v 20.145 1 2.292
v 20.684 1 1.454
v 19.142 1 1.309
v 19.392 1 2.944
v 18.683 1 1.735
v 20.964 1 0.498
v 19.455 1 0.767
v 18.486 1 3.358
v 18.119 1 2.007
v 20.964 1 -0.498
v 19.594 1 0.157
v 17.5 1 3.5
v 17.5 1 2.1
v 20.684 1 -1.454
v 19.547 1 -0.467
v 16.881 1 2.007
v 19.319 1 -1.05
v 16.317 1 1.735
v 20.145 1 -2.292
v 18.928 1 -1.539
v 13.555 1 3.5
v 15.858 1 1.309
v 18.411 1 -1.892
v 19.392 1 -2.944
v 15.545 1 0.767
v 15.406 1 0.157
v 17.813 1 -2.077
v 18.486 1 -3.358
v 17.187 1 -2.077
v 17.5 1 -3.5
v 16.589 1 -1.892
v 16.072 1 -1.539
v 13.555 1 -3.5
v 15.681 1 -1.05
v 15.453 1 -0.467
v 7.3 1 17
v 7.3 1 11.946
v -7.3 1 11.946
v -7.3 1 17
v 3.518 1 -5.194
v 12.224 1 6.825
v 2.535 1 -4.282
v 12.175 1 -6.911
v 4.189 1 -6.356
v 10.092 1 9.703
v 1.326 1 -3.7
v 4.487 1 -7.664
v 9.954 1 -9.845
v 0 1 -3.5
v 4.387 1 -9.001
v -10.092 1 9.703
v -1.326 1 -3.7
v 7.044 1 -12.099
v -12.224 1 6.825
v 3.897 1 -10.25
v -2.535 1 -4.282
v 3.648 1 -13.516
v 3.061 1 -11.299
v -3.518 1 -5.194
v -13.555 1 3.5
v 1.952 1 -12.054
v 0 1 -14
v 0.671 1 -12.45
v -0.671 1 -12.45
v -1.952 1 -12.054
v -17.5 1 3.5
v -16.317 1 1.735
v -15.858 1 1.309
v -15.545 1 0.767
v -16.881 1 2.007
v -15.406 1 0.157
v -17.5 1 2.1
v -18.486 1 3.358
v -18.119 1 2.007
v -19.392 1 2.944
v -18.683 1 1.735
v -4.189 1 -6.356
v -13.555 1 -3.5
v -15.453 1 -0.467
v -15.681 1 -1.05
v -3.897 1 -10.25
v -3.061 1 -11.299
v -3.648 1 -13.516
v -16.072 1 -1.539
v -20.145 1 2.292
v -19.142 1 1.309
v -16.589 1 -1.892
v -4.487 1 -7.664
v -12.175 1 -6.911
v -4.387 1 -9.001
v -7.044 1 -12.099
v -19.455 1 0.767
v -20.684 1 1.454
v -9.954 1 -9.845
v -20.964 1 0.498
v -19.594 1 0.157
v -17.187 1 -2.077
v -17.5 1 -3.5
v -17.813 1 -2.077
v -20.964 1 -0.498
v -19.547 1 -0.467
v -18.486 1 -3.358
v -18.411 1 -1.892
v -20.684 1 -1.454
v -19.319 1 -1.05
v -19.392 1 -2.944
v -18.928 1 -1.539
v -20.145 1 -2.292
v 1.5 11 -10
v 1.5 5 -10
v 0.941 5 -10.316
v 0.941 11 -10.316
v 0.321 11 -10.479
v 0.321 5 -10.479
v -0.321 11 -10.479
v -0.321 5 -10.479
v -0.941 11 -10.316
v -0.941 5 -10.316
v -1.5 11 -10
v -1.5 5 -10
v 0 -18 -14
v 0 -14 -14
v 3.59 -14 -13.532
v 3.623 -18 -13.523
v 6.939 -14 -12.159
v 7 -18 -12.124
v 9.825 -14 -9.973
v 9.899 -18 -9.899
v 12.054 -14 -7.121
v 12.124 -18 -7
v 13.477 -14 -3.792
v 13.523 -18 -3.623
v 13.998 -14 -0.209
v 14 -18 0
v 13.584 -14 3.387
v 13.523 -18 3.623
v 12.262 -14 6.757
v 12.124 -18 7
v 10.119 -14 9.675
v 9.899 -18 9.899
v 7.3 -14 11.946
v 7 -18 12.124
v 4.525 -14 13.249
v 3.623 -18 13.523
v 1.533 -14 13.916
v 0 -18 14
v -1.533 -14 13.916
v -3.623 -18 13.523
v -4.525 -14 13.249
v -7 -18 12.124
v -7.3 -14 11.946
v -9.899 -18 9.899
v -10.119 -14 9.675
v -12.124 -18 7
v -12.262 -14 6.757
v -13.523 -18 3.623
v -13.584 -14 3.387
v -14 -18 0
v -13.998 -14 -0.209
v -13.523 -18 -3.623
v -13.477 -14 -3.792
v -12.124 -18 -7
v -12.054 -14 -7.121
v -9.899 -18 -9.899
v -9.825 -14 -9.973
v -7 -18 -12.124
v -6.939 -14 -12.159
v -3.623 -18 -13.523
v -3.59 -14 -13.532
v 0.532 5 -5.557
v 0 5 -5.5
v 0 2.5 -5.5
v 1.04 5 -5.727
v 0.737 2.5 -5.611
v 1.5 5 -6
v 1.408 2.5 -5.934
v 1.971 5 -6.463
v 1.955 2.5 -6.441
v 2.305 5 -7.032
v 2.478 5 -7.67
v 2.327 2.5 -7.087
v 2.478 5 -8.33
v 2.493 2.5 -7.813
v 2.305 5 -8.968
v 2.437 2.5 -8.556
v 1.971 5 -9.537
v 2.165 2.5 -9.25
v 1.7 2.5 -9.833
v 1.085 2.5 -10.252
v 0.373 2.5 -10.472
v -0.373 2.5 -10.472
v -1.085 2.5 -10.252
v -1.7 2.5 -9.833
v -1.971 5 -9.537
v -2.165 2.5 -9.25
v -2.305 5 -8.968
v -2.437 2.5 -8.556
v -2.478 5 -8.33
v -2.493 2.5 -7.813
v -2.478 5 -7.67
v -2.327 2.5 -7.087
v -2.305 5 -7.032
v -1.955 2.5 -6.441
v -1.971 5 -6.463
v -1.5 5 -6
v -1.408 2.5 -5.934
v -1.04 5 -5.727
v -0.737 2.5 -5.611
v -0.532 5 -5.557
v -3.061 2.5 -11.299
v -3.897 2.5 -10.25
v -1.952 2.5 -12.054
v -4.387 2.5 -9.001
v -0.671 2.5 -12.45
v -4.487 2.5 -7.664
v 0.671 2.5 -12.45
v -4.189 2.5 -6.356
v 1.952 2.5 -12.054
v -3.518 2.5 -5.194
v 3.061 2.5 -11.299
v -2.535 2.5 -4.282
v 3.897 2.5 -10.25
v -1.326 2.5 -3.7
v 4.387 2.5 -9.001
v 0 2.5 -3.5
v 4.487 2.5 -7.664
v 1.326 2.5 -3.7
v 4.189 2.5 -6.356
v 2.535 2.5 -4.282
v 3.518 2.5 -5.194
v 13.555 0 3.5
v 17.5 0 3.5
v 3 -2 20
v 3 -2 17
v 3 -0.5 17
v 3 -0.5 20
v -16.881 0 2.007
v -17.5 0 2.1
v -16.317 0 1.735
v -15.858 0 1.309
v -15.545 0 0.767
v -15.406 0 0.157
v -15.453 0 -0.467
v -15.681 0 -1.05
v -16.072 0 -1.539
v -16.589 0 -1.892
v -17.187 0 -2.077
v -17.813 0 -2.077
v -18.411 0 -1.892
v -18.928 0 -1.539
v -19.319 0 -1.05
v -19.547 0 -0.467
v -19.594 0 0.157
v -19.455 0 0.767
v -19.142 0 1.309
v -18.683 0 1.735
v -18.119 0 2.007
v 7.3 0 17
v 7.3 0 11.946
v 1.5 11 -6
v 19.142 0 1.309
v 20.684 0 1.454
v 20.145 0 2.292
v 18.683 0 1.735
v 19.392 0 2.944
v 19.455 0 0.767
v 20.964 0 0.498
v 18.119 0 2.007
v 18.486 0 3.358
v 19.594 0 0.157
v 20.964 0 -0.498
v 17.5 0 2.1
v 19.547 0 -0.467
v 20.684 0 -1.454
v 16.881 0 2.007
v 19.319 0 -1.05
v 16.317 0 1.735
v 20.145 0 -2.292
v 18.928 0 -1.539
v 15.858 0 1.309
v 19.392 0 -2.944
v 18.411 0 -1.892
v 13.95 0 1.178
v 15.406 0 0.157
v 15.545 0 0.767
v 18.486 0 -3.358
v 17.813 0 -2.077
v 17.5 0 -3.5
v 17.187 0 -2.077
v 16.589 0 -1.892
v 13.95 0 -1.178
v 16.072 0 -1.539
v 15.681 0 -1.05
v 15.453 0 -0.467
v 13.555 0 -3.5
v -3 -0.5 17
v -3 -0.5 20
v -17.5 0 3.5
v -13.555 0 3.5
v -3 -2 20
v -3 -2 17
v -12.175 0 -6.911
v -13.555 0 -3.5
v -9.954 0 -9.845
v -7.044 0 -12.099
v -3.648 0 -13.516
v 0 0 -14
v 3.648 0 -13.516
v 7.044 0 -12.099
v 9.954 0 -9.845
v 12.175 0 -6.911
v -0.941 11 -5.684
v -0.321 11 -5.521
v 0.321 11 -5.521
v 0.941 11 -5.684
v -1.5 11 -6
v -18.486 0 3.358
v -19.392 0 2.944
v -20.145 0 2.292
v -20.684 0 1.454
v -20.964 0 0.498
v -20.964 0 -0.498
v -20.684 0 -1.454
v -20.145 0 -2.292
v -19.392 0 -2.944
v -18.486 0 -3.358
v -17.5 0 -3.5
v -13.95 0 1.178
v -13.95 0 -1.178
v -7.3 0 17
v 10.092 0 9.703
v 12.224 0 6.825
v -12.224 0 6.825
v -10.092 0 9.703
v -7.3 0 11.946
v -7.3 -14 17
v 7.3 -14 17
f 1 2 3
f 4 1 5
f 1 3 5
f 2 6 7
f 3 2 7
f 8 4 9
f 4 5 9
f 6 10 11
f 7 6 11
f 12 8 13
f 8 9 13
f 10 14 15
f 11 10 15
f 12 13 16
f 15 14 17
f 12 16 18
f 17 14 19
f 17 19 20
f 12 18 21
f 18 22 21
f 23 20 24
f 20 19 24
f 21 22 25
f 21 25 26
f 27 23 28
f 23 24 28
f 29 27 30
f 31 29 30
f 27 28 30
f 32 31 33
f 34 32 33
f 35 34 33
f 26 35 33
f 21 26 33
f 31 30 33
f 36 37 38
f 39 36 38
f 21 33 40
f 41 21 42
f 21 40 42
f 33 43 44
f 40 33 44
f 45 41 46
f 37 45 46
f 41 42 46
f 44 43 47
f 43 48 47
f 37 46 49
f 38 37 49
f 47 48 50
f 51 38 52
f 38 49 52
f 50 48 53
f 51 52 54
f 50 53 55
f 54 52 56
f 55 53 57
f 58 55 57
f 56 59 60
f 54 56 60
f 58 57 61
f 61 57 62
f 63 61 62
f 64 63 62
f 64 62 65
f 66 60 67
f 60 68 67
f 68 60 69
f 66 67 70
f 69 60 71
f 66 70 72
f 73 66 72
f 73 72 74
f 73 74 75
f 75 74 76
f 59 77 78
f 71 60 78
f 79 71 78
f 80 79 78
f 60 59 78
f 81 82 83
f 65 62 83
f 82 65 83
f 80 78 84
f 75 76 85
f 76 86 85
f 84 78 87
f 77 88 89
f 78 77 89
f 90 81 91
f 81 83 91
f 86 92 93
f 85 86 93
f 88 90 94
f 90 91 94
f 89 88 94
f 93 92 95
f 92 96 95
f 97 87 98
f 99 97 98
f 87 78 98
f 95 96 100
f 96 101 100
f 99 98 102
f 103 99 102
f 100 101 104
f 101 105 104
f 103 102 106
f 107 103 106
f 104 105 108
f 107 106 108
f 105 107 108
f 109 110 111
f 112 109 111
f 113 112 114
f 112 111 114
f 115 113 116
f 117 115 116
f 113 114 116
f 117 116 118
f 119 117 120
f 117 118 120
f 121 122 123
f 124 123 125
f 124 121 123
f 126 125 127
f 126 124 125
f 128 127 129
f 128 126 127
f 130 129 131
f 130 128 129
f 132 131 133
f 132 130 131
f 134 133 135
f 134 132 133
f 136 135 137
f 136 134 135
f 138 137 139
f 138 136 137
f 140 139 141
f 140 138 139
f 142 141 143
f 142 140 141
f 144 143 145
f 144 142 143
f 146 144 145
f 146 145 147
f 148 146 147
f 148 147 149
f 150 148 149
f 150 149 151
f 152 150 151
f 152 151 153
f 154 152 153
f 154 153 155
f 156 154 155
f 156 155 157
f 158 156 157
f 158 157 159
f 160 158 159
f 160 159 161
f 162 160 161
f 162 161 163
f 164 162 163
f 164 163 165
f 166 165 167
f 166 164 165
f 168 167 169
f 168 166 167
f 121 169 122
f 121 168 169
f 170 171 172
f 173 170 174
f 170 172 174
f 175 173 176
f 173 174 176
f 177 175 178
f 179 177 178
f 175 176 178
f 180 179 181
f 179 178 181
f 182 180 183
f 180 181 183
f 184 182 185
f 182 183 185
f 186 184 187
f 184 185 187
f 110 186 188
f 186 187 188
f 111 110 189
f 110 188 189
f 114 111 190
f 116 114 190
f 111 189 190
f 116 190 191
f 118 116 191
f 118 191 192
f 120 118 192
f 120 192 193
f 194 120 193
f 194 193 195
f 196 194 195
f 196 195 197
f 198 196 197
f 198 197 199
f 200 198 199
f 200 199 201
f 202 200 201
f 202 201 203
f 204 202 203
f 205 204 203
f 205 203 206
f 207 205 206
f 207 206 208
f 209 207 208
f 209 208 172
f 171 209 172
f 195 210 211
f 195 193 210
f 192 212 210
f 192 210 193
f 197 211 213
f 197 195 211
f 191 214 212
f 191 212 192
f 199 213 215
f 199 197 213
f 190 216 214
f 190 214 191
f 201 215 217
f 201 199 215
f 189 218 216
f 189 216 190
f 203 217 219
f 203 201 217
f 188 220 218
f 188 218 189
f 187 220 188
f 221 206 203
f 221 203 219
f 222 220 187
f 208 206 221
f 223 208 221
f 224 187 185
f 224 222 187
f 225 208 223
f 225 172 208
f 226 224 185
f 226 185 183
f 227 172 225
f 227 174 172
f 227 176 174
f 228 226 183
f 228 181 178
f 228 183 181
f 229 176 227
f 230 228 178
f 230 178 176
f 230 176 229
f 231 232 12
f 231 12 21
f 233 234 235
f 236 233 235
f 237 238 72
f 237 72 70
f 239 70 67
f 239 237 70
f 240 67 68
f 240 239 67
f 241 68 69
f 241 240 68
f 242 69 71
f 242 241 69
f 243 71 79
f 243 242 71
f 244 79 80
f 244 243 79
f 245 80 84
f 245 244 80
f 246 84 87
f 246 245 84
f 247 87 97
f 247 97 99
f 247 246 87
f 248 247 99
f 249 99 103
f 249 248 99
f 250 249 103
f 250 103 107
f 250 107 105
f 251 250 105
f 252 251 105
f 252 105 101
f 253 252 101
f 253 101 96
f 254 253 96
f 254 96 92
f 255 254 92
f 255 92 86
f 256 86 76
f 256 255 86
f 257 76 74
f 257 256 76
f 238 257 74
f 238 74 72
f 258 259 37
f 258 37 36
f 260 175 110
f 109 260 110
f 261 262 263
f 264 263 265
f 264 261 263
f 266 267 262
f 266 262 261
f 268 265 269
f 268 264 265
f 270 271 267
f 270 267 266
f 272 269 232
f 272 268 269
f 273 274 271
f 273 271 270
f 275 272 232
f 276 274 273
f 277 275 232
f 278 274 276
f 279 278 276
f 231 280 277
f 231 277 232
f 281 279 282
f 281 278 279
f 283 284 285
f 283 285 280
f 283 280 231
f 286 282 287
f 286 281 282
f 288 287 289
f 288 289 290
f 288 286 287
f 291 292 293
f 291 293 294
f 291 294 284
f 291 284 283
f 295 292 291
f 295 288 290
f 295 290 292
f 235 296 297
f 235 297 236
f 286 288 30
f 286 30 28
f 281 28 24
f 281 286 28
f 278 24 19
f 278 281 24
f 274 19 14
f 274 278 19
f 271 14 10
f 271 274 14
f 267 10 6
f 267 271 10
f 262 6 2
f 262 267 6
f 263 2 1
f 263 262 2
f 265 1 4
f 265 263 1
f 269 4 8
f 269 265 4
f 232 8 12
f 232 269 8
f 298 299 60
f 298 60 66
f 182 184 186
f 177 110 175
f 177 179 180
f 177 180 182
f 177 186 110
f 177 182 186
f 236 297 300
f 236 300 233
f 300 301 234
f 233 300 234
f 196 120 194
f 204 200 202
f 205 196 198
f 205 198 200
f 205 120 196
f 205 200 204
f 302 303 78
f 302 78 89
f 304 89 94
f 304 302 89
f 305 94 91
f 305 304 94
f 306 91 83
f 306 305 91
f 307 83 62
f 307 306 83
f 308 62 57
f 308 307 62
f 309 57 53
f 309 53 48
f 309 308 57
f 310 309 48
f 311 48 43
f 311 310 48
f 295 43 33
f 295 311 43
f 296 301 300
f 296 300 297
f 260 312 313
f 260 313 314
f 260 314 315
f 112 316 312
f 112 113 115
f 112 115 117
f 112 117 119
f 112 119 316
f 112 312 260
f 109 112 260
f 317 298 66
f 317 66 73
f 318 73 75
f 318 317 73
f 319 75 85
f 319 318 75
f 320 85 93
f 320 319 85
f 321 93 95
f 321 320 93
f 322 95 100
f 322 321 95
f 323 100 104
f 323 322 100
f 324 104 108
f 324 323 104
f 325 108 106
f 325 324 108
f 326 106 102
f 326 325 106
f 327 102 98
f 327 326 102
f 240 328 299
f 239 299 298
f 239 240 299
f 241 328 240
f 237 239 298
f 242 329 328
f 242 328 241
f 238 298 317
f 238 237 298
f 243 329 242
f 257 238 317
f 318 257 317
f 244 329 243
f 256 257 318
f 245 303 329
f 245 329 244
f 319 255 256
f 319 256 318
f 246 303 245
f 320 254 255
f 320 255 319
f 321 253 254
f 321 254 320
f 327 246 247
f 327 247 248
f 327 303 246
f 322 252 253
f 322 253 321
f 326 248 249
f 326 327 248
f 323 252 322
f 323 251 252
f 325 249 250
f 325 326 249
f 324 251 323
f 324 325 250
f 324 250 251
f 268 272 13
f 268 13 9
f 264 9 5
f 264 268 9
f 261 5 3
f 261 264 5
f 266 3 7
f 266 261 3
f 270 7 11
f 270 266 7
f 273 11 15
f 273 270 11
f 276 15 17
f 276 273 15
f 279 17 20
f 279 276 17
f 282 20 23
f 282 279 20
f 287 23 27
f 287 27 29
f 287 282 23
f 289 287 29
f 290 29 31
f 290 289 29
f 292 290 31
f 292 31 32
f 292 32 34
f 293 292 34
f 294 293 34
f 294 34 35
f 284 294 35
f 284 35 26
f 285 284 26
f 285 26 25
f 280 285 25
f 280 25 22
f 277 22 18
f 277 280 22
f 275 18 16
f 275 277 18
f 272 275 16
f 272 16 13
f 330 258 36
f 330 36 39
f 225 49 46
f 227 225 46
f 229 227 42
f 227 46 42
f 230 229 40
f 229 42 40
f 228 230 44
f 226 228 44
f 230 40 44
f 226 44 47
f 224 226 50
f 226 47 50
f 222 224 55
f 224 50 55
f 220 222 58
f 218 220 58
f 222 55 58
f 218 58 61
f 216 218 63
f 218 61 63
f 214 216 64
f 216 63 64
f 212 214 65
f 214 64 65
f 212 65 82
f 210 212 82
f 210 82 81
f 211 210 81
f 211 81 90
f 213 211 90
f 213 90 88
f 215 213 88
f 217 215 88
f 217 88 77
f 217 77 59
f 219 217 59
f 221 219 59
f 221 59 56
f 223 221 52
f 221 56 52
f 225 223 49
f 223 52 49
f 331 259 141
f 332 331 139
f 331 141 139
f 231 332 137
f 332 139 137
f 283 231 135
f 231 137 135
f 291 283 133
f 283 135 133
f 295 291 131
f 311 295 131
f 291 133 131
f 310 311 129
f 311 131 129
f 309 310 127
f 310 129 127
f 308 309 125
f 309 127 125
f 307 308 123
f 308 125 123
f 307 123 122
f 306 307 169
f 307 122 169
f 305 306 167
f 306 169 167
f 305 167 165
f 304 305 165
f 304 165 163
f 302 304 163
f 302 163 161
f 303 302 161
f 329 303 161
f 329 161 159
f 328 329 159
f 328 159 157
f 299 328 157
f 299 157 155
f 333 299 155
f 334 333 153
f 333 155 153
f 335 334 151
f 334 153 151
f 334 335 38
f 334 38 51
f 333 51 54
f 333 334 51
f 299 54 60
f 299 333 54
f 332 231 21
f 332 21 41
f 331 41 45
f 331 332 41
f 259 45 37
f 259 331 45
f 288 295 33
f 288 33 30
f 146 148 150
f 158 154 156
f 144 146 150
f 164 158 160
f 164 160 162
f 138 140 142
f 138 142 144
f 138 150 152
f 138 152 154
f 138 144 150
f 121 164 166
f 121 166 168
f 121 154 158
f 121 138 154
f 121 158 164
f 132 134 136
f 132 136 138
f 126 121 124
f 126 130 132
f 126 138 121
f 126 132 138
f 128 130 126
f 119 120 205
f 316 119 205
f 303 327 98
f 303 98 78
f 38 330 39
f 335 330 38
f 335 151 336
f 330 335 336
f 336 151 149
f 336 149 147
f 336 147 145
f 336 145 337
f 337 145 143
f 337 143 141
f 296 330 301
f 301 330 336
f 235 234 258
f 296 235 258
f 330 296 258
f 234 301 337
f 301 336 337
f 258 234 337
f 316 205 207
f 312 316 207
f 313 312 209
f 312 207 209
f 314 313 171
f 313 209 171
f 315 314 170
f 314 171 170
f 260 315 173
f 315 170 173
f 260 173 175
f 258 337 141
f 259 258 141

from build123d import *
from build123d.topology import SkipClean

# Parameters (mm, degrees)
SKETCH1_R           = 2.1
BOSS_EXTRUDE1_DEPTH = 1
BOSS_EXTRUDE2_START = -14
BOSS_EXTRUDE2_DEPTH = 14
BOSS_EXTRUDE3_START = 4
SKETCH3_R           = 14
BOSS_EXTRUDE3_DEPTH = 4
SKETCH4_R           = 4.5
BOSS_EXTRUDE4_DEPTH = 1.5
SKETCH5_R           = 2.5
BOSS_EXTRUDE5_DEPTH = 2.5
BOSS_EXTRUDE6_DEPTH = 6
SKETCH7_W           = 6
SKETCH7_H           = 1.5
BOSS_EXTRUDE7_DEPTH = 3


with BuildPart() as part:
    # Sketch1 → Boss-Extrude1 (new body)
    with BuildSketch(Plane(origin=(0, 0, 0), x_dir=(1, 0, 0), z_dir=(0, 1, 0))):
        with BuildLine():
            Line((-17.5, 3.5), (-13.555441712, 3.5))
            ThreePointArc((-13.555441712, 3.5), (0, 14), (13.555441712, 3.5))
            Line((13.555441712, 3.5), (17.5, 3.5))
            ThreePointArc((17.5, 3.5), (21, 0), (17.5, -3.5))
            Line((17.5, -3.5), (13.555441712, -3.5))
            ThreePointArc((13.555441712, -3.5), (11.250406053, -8.332368429), (7.3, -11.94612908))
            Line((7.3, -11.94612908), (7.3, -17))
            Line((7.3, -17), (-7.3, -17))
            Line((-7.3, -17), (-7.3, -11.94612908))
            ThreePointArc((-7.3, -11.94612908), (-11.250406053, -8.332368429), (-13.555441712, -3.5))
            Line((-13.555441712, -3.5), (-17.5, -3.5))
            ThreePointArc((-17.5, -3.5), (-21, 0), (-17.5, 3.5))
        make_face()
        with Locations(Location((-17.5, 0, 0), (0, 0, 270))):
            Circle(SKETCH1_R, mode=Mode.SUBTRACT)
        with Locations(Location((17.5, 0, 0), (0, 0, 270))):
            Circle(SKETCH1_R, mode=Mode.SUBTRACT)
    extrude(amount=BOSS_EXTRUDE1_DEPTH)

    # Sketch2 → Boss-Extrude2 (add)
    with SkipClean():  # the faces are left unmerged after this step: merging them gives an invalid solid
        with BuildSketch(Plane(origin=(0, 0, 0), x_dir=(1, 0, 0), z_dir=(0, 1, 0)).offset(BOSS_EXTRUDE2_START)):
            with BuildLine():
                Line((-7.3, -17), (7.3, -17))
                Line((7.3, -17), (7.3, -11.94612908))
                ThreePointArc((7.3, -11.94612908), (0, 14), (-7.3, -11.94612908))
                Line((-7.3, -11.94612908), (-7.3, -17))
            make_face()
        extrude(amount=BOSS_EXTRUDE2_DEPTH)

    # Sketch3 → Boss-Extrude3 (add)
    with SkipClean():  # the faces are left unmerged after this step: merging them gives an invalid solid
        with BuildSketch(Plane.XZ.offset(14).offset(BOSS_EXTRUDE3_START)):
            with Locations(Location((0, 0, 0), (0, 0, 270))):
                Circle(SKETCH3_R)
        extrude(amount=-BOSS_EXTRUDE3_DEPTH)

    # Sketch4 → Boss-Extrude4 (add)
    with SkipClean():  # the faces are left unmerged after this step: merging them gives an invalid solid
        with BuildSketch(Plane(origin=(0, 1, 0), x_dir=(1, 0, 0), z_dir=(0, 1, 0))):
            with Locations(Location((0, 8, 0), (0, 0, 270))):
                Circle(SKETCH4_R)
        extrude(amount=BOSS_EXTRUDE4_DEPTH)

    # Sketch5 → Boss-Extrude5 (add)
    with SkipClean():  # the faces are left unmerged after this step: merging them gives an invalid solid
        with BuildSketch(Plane(origin=(0, 2.5, 0), x_dir=(1, 0, 0), z_dir=(0, 1, 0))):
            with Locations(Location((0, 8, 0), (0, 0, 270))):
                Circle(SKETCH5_R)
        extrude(amount=BOSS_EXTRUDE5_DEPTH)

    # Sketch6 → Boss-Extrude6 (add)
    with SkipClean():  # the faces are left unmerged after this step: merging them gives an invalid solid
        with BuildSketch(Plane(origin=(0, 5, 0), x_dir=(1, 0, 0), z_dir=(0, 1, 0))):
            with BuildLine():
                ThreePointArc((-1.5, 6), (0, 5.5), (1.5, 6))
                Line((1.5, 6), (1.5, 10))
                ThreePointArc((1.5, 10), (0, 10.5), (-1.5, 10))
                Line((-1.5, 10), (-1.5, 6))
            make_face()
        extrude(amount=BOSS_EXTRUDE6_DEPTH)

    # Sketch7 → Boss-Extrude7 (add)
    with SkipClean():  # the faces are left unmerged after this step: merging them gives an invalid solid
        with BuildSketch(Plane.XY.offset(17)):
            with Locations((0, -1.25)):
                Rectangle(SKETCH7_W, SKETCH7_H)
        extrude(amount=BOSS_EXTRUDE7_DEPTH)


solid = part.part
